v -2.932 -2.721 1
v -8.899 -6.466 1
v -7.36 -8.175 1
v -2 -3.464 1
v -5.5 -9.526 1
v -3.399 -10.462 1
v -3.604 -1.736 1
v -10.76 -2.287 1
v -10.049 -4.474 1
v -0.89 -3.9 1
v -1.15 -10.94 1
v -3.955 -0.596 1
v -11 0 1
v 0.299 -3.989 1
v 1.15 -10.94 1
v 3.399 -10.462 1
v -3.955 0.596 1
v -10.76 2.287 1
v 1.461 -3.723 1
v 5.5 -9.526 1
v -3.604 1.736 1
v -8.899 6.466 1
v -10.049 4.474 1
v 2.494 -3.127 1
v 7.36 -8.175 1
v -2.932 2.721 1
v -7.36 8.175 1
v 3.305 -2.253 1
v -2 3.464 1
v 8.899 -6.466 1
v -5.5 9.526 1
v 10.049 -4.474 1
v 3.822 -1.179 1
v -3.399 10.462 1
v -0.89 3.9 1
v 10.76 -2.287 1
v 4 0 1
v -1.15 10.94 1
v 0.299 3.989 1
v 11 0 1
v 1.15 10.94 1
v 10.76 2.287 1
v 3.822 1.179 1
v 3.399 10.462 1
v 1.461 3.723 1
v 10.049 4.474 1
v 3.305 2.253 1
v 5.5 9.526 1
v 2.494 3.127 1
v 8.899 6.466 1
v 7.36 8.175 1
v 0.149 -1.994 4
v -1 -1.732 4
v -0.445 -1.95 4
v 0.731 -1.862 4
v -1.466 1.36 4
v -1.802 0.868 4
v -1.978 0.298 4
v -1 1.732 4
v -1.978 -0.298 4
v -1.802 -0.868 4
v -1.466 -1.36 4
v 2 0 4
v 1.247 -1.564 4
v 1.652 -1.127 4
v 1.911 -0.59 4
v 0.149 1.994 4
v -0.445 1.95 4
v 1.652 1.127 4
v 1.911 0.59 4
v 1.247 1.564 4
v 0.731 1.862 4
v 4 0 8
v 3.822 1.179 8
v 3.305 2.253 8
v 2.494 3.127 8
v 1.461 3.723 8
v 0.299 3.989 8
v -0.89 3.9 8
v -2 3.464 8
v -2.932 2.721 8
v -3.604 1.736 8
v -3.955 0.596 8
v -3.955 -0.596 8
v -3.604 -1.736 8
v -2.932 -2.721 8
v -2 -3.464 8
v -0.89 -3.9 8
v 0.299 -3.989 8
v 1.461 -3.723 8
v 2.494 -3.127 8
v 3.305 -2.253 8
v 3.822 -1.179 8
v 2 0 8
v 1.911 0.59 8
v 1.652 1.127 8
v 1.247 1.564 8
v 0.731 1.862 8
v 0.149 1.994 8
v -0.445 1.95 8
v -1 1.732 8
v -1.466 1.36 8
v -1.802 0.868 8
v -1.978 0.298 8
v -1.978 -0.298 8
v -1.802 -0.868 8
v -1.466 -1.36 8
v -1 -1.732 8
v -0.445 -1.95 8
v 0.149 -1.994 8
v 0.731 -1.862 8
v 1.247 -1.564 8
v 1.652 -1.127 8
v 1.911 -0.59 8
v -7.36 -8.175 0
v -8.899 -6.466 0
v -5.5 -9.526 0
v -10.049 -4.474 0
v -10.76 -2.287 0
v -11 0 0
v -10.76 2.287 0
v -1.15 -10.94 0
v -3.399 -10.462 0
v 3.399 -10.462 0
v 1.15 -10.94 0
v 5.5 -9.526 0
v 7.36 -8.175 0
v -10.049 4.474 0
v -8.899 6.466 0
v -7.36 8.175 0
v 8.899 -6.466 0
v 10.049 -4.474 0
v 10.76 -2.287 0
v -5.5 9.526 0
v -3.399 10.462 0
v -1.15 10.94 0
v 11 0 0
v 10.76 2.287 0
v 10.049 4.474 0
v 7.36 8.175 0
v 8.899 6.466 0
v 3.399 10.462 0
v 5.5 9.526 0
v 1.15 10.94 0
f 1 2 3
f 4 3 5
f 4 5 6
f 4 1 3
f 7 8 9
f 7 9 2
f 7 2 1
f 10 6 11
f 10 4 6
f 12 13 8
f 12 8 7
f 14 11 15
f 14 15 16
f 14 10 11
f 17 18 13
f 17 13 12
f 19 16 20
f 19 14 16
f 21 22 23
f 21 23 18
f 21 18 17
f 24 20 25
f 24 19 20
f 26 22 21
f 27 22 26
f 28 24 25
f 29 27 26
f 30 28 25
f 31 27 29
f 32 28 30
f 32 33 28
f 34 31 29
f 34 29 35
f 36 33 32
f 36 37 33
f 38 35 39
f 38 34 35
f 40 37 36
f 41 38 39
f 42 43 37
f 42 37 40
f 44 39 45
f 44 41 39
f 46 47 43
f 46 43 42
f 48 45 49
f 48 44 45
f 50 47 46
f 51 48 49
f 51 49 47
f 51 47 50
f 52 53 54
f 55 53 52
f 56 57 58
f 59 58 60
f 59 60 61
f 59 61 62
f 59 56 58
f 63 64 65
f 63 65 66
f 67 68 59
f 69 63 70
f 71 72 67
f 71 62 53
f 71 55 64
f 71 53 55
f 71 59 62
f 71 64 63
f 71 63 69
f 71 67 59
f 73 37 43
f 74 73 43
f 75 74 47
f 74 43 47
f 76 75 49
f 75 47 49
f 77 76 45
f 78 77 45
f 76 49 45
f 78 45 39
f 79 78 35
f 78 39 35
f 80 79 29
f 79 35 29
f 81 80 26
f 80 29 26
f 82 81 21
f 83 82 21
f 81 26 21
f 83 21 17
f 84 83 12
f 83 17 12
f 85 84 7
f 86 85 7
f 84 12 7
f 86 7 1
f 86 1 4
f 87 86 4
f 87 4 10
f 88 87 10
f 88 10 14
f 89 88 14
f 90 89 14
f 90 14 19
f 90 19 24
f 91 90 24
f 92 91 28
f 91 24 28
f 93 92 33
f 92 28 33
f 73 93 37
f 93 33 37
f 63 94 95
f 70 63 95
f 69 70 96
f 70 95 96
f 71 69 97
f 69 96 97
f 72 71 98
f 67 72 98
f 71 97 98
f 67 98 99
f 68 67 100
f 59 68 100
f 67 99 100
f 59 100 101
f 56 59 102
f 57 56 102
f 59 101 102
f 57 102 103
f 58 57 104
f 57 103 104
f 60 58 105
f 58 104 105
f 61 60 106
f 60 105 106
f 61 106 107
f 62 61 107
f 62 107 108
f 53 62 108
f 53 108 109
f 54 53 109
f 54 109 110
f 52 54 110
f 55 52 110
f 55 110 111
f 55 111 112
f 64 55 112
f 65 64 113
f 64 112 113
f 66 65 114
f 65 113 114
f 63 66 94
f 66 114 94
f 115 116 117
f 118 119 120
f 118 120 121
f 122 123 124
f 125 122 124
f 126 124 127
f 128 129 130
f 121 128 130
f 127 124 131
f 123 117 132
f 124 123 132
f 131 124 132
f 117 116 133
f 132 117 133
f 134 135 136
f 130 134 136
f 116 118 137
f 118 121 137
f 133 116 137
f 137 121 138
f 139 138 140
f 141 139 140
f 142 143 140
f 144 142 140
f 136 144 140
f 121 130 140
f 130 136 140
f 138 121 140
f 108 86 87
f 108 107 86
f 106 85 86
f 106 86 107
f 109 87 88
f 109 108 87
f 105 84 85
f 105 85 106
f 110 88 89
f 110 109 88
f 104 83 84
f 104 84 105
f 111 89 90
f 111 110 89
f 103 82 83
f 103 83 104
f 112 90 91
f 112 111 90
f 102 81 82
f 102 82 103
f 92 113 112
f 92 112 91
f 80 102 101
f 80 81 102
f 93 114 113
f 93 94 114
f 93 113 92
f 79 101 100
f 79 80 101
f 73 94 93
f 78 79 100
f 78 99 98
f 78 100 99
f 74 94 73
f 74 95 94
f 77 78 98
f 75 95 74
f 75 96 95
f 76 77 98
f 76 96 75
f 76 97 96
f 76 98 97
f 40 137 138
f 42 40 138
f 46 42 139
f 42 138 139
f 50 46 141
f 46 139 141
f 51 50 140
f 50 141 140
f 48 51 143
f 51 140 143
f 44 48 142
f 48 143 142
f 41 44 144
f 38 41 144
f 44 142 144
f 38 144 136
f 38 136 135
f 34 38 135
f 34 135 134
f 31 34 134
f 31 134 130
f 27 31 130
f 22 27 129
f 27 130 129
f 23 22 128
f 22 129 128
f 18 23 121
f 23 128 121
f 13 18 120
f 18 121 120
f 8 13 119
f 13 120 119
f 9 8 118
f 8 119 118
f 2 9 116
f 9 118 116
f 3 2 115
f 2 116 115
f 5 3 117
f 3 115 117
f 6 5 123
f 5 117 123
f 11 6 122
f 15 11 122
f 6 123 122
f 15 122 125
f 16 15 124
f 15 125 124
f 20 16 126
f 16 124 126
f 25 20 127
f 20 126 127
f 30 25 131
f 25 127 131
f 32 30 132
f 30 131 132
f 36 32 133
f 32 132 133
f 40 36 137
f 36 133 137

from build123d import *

# Parameters (mm, degrees)
F0_R     = 11
F0_R_2   = 4
F1_DEPTH = 1
F2_R     = 4
F3_DEPTH = 7
F4_R     = 2
F5_DEPTH = 4


with BuildPart() as f1:
    # F0 (on Top) → F1 (new body)
    with BuildSketch(Plane.XY):
        Circle(F0_R)
        Circle(F0_R_2, mode=Mode.SUBTRACT)
        Circle(F0_R_2)
    extrude(amount=F1_DEPTH)

    # F2 (on face) → F3 (join)
    with BuildSketch(Plane.XY.offset(1)):
        Circle(F2_R)
    extrude(amount=F3_DEPTH)

    # F4 (on face) → F5 (cut)
    with BuildSketch(Plane.XY.offset(8)):
        Circle(F4_R)
    extrude(amount=-F5_DEPTH, mode=Mode.SUBTRACT)


solid = f1.part
